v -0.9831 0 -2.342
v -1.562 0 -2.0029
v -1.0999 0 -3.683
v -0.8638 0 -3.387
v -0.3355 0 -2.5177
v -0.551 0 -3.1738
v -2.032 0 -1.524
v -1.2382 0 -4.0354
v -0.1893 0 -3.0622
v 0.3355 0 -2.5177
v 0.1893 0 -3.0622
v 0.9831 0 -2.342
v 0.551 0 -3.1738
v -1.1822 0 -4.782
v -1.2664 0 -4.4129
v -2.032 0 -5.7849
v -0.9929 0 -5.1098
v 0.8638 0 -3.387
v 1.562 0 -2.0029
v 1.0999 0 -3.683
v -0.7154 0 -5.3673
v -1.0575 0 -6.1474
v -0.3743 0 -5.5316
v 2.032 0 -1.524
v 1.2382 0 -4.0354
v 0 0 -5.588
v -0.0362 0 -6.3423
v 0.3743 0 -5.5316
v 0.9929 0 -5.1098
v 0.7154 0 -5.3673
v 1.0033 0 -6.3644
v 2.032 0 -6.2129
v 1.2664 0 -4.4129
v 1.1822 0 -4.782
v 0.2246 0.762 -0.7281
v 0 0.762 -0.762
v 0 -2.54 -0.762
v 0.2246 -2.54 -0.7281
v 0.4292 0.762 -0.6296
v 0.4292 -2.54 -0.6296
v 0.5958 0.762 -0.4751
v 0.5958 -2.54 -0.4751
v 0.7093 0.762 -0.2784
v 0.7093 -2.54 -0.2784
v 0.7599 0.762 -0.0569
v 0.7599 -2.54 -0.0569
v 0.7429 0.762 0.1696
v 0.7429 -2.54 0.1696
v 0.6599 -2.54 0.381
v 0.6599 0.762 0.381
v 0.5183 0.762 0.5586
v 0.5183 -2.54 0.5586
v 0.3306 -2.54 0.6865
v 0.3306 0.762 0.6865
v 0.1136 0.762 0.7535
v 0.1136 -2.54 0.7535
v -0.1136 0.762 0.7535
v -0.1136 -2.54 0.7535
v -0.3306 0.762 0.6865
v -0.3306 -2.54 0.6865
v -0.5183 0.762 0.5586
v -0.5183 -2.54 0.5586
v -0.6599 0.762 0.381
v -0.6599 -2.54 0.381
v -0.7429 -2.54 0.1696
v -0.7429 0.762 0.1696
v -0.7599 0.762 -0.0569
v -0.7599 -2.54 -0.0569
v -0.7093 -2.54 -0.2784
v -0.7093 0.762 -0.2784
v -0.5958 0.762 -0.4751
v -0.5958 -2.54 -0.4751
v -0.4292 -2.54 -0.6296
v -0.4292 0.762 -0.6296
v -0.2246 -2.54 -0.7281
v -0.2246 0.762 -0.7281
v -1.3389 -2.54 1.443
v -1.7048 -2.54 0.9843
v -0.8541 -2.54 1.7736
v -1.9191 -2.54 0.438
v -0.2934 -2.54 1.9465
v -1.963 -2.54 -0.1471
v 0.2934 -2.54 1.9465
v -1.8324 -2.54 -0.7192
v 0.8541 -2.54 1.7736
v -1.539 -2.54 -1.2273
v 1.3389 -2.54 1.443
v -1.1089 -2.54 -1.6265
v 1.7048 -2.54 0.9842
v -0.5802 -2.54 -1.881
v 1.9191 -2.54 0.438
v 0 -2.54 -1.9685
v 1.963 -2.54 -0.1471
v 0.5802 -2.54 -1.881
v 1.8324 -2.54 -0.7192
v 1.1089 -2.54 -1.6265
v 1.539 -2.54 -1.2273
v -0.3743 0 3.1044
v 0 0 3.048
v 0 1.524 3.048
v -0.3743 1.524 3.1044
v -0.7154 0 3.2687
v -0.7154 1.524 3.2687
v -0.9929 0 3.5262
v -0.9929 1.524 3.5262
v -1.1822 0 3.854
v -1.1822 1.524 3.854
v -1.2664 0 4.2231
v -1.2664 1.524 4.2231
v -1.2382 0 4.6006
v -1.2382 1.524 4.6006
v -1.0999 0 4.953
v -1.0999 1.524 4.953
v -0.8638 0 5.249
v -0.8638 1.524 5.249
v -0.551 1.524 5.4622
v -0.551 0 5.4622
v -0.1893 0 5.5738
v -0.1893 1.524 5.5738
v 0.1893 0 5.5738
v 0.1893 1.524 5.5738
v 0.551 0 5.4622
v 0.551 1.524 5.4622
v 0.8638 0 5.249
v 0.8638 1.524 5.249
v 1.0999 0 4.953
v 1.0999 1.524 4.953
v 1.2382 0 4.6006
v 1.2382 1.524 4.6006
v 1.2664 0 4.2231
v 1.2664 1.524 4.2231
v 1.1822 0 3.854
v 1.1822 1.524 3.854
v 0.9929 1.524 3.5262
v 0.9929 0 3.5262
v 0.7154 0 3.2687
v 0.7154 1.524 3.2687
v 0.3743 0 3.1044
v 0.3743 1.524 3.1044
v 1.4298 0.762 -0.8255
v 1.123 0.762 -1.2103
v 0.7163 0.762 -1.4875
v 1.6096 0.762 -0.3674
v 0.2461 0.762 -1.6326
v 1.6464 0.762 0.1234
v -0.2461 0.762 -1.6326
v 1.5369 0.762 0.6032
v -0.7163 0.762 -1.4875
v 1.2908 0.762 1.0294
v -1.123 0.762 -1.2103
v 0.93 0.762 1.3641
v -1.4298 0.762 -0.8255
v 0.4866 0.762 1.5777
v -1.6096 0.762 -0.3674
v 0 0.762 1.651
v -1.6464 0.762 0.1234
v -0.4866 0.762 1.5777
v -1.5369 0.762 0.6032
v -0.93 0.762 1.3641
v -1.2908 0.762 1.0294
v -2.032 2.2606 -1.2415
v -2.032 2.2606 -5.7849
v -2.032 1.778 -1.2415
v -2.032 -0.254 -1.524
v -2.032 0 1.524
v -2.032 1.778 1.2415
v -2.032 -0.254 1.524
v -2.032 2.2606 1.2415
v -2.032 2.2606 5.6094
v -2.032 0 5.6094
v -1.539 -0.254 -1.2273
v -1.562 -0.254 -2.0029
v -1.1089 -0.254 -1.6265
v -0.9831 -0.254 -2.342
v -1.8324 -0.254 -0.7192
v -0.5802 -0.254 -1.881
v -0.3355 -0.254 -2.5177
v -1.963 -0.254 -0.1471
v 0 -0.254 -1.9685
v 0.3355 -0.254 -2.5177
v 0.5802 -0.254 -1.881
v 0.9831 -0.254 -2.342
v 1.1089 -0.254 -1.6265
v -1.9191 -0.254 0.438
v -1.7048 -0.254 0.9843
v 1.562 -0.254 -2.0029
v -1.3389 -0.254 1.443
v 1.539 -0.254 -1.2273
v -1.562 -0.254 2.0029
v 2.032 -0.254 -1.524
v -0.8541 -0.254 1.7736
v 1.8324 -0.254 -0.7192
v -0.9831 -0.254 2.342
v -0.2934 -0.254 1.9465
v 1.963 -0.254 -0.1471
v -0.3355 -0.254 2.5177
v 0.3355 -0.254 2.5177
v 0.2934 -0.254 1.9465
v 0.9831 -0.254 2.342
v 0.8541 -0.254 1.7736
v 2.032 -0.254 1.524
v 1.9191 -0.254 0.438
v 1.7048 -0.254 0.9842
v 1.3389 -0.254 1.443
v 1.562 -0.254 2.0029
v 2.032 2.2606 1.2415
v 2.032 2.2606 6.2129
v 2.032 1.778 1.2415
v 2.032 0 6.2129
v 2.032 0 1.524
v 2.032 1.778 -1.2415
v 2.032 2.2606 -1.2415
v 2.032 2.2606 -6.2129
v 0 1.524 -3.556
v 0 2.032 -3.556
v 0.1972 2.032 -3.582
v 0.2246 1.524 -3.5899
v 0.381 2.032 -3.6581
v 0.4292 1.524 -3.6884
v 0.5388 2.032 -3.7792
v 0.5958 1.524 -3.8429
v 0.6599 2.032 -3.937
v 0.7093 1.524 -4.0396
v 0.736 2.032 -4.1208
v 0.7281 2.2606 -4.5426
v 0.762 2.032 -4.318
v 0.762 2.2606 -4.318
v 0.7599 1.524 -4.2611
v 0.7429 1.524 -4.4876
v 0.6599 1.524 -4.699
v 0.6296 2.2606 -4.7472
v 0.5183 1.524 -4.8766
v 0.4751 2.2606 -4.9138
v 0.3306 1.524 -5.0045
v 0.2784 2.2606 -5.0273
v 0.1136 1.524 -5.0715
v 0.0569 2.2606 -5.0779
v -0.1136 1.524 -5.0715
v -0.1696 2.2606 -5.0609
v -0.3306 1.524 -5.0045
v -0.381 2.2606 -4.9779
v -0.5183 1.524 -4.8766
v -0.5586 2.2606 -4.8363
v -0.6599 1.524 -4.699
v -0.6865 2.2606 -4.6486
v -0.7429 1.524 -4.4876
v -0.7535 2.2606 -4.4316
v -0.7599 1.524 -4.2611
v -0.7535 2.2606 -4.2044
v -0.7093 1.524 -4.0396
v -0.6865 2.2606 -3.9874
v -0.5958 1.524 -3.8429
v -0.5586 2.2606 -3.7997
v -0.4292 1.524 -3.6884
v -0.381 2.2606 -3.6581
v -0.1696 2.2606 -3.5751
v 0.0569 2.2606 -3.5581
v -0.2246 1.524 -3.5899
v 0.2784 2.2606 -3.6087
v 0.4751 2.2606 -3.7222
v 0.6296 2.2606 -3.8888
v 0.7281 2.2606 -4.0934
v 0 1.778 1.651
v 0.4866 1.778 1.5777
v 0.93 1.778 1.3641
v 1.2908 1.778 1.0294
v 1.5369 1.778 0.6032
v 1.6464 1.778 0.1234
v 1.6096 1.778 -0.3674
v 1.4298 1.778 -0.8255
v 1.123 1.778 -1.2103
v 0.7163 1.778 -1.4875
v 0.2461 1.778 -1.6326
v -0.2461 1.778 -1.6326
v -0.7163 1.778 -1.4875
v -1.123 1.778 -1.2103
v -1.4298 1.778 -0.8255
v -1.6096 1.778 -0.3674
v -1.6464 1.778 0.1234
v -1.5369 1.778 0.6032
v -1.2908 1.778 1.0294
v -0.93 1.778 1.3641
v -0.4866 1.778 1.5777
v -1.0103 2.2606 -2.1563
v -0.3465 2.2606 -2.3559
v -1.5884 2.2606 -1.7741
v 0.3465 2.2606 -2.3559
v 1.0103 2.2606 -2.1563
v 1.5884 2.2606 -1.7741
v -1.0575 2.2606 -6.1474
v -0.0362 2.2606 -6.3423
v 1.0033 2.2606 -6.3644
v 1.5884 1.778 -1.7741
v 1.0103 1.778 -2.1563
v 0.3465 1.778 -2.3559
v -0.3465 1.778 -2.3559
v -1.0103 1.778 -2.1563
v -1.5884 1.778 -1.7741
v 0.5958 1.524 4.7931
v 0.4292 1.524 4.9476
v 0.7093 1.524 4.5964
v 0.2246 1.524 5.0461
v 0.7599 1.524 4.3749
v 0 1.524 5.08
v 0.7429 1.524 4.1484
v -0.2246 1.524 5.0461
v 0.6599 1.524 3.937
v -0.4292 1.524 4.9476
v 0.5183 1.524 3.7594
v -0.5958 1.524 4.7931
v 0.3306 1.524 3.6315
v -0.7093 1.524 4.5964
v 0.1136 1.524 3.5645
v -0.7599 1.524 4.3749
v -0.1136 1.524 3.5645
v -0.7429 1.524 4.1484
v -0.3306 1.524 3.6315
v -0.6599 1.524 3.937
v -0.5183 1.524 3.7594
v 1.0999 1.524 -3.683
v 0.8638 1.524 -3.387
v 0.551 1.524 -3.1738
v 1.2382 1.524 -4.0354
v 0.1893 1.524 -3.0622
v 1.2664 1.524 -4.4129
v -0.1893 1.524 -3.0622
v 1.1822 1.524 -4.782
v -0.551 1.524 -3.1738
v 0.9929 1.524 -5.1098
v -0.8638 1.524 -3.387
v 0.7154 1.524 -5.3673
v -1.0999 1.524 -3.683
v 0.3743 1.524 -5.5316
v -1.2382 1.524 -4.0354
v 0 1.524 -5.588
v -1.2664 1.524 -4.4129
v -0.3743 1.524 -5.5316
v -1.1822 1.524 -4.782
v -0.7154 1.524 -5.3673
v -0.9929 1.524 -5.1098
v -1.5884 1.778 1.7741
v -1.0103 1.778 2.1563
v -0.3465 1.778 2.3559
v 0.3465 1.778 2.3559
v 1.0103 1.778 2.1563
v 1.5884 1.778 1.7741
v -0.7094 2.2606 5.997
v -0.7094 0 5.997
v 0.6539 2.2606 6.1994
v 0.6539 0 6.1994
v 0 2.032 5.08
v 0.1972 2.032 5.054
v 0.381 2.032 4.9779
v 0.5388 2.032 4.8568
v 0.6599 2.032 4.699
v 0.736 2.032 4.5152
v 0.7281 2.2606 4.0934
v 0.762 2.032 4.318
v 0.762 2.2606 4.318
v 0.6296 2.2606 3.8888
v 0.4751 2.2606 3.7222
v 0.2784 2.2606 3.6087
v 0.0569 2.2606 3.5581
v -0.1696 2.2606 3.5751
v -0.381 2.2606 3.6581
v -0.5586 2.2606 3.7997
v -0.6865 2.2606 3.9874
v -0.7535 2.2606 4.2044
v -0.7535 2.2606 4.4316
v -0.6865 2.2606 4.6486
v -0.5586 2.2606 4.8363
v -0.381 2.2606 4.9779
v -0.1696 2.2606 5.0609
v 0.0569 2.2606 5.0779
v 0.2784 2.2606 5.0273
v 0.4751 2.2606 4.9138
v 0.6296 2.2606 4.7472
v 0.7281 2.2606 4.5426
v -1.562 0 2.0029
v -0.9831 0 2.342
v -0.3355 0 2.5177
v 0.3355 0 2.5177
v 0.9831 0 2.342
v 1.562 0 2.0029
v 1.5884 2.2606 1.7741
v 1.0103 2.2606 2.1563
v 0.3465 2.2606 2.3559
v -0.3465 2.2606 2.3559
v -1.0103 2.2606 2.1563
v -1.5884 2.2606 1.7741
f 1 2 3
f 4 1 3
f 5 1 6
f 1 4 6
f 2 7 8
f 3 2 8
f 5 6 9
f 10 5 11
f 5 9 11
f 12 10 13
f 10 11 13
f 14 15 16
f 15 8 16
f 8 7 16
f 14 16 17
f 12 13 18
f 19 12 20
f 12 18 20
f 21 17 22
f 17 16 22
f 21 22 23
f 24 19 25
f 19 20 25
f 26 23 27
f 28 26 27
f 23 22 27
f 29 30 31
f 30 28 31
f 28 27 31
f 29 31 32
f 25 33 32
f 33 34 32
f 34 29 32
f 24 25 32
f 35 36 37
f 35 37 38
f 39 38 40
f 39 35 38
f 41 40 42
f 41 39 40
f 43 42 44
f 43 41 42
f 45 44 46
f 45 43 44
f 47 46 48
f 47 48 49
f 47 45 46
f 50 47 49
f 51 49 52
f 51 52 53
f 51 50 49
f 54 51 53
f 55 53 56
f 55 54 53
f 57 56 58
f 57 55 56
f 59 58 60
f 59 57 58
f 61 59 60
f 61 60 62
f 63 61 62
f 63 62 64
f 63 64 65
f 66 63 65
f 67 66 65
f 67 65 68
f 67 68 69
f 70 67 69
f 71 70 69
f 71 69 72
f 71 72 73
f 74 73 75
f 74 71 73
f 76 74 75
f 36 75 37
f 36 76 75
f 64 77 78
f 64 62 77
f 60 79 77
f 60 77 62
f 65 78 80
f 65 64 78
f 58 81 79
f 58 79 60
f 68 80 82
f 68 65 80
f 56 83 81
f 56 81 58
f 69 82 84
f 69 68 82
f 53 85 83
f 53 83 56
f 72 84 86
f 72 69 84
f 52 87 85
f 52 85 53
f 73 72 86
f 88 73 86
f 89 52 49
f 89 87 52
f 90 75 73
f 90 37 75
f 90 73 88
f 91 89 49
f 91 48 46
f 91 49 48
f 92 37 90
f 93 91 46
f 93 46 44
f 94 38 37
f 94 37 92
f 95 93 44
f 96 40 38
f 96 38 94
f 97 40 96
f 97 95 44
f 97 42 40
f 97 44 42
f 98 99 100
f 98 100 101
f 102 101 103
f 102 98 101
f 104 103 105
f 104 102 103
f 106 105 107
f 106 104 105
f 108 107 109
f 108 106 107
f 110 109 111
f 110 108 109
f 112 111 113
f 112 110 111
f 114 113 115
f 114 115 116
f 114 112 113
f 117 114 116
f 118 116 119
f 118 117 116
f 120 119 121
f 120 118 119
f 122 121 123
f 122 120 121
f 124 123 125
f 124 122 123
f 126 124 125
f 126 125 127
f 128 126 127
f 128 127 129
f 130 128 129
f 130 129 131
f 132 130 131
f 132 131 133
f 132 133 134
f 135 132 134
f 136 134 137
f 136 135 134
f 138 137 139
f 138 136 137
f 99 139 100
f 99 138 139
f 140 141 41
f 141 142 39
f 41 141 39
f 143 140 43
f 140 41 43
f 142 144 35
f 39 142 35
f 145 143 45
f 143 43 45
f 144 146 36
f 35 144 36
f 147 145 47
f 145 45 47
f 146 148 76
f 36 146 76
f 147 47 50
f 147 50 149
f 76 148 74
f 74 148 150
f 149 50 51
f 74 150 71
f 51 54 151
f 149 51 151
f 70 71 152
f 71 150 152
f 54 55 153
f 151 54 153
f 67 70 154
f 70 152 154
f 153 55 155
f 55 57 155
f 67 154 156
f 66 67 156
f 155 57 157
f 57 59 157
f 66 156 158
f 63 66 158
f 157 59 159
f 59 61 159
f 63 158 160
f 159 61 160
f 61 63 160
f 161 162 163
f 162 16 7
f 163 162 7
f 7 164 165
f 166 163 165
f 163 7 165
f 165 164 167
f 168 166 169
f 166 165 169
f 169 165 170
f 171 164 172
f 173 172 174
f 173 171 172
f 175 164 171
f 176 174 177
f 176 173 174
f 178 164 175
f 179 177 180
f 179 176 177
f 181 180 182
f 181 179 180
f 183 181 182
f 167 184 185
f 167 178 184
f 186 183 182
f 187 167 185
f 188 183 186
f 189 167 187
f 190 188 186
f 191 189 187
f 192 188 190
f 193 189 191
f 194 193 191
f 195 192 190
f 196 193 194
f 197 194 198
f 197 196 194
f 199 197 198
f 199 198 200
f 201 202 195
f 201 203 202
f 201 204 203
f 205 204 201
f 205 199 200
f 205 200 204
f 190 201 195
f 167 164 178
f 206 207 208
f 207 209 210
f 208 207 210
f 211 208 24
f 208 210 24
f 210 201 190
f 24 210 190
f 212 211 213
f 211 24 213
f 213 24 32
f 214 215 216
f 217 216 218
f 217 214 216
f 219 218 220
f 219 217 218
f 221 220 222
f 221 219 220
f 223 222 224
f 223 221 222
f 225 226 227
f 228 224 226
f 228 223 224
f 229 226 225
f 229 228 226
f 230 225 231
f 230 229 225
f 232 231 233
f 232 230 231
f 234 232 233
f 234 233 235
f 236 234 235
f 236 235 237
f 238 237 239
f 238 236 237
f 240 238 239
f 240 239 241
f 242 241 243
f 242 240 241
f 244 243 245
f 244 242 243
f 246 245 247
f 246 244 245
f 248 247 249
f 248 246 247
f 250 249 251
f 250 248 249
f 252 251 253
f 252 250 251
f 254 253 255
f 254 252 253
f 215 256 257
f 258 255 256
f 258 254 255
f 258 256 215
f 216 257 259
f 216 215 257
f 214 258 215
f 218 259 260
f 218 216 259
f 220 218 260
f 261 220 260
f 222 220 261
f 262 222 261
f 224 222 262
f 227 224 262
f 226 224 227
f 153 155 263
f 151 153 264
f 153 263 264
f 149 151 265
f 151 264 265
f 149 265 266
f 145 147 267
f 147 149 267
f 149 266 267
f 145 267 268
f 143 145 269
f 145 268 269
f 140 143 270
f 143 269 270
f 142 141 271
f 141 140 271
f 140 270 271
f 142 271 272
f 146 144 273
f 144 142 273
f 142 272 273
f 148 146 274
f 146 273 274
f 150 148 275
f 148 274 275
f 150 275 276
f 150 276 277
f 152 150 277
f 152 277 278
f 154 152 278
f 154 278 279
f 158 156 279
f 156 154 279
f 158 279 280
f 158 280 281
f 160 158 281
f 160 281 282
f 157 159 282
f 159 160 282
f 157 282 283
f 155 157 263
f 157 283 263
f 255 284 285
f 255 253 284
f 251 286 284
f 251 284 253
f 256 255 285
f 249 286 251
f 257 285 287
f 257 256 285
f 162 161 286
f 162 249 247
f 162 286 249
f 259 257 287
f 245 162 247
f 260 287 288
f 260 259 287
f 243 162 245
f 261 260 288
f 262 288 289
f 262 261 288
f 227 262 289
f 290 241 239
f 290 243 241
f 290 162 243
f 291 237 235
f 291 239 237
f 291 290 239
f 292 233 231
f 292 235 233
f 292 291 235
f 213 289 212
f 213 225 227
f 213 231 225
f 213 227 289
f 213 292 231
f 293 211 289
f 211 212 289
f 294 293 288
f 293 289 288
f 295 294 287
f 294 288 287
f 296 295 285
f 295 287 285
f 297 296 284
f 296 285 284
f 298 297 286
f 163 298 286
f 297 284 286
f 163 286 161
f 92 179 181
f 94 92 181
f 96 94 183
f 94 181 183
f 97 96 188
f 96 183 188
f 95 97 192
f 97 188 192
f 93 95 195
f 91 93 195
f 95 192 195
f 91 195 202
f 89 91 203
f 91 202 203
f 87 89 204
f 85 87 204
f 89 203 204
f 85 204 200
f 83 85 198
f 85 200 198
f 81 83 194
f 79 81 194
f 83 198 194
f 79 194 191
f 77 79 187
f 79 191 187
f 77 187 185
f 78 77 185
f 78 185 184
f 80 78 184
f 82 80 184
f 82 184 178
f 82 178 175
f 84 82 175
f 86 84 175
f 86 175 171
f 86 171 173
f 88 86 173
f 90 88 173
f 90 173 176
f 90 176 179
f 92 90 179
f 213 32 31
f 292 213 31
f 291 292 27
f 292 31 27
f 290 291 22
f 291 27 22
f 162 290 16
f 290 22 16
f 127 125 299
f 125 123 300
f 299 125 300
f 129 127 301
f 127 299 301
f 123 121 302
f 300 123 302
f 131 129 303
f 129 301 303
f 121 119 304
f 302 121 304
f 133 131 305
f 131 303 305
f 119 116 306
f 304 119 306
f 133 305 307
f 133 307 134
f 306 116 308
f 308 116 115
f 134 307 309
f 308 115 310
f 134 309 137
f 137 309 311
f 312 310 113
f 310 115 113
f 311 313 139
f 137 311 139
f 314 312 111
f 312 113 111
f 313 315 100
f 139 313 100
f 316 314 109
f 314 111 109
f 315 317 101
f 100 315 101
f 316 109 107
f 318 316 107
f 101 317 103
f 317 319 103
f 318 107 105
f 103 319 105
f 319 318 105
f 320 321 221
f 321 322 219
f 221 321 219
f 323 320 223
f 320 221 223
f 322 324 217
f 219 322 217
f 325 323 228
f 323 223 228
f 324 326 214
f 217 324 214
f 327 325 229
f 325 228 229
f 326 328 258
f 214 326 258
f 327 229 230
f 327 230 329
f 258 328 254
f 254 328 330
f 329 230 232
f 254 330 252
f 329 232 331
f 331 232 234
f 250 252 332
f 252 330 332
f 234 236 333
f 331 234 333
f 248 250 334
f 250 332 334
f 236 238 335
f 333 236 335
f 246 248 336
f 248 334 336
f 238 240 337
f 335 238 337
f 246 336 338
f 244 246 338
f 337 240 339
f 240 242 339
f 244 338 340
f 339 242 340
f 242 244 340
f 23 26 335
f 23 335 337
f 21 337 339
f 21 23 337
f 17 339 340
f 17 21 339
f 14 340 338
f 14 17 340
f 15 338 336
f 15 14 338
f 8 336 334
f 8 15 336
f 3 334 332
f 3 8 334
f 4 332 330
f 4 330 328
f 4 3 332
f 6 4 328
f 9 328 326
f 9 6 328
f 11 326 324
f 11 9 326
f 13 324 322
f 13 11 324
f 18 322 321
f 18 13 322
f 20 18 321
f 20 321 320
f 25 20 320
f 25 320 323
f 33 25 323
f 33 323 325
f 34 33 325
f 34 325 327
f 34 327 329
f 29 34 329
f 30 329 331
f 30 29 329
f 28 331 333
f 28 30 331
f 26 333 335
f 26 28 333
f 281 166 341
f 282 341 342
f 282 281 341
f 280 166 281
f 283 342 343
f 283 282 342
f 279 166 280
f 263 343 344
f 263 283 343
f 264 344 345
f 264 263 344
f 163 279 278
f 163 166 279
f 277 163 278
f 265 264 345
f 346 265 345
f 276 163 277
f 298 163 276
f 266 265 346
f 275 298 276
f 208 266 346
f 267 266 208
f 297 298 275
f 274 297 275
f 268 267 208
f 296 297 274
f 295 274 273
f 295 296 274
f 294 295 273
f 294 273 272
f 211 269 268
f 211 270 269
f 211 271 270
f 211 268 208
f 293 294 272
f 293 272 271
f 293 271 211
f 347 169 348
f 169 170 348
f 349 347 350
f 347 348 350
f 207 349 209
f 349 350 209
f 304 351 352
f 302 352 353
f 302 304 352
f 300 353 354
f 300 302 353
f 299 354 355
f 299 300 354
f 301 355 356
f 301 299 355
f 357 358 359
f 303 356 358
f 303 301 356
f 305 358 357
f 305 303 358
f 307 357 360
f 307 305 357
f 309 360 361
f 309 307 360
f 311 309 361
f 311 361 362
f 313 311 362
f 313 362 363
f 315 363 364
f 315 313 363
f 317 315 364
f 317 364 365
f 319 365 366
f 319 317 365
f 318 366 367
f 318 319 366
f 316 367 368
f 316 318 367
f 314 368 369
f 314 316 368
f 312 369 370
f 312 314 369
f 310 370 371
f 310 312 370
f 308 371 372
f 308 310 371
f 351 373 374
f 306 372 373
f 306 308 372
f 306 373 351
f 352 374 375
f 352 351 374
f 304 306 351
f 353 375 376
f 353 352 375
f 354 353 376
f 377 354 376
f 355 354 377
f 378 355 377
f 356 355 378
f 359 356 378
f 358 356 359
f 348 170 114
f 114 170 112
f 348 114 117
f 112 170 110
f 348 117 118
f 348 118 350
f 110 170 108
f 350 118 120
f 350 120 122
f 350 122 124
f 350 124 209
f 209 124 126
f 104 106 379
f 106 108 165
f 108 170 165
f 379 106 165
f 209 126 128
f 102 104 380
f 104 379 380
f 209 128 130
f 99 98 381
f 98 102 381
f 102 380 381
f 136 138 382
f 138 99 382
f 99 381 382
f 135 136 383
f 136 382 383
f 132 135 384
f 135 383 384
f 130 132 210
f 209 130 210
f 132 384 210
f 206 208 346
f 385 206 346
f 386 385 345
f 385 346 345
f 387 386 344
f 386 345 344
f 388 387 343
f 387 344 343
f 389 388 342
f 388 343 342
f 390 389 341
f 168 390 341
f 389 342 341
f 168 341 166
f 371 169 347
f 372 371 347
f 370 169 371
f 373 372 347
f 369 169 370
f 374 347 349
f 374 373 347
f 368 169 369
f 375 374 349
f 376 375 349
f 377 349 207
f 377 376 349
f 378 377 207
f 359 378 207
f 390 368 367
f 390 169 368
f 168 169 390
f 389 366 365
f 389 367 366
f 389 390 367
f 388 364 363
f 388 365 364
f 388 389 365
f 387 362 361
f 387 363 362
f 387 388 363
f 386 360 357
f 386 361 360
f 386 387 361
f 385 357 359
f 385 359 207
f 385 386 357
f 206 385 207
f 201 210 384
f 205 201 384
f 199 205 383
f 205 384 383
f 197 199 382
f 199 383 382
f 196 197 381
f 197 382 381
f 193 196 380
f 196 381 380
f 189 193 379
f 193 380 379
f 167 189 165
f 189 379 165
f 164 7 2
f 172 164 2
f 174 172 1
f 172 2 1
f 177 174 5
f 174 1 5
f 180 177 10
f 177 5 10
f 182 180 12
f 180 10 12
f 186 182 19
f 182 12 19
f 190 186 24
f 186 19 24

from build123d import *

# Parameters (mm, degrees)
SKETCH1_R                = 1.524
SKETCH1_R_2              = 1.27
SKETCH1_R_3              = 0.762
BOSS_EXTRUDE1_DEPTH      = 2.032
SKETCH1_3_R              = 1.27
SKETCH1_3_R_2            = 0.762
CUT_EXTRUDE1_DEPTH       = 1.524
SKETCH3_R                = 1.651
CUT_EXTRUDE2_DEPTH       = 0.254
SKETCH3_3_R              = 1.651
CUT_EXTRUDE3_DEPTH       = 2.032
SKETCH4_R                = 1.9685
BOSS_EXTRUDE2_DEPTH      = 0.254
BOSS_EXTRUDE3_DEPTH      = 2.54
BOSS_EXTRUDE3_DEPTH_BACK = 0.762
SKETCH4_3_R              = 1.9685
SKETCH4_3_R_2            = 1.651
SKETCH4_3_R_3            = 0.762
CUT_EXTRUDE4_DEPTH       = 2.032
SKETCH10_R               = 0.762
BOSS_EXTRUDE4_DEPTH      = 0.2286


with BuildPart() as part:
    # Sketch1 → Boss-Extrude1 (new body)
    # profile 1 of 7: a face of its own
    with BuildSketch(Plane(origin=(0, 0, 0), x_dir=(1, 0, 0), z_dir=(0, 1, 0))):
        with BuildLine():
            Line((2.032, -6.212875778), (2.032, -1.24150214))
            ThreePointArc((2.032, -1.24150214), (0, -2.38125), (-2.032, -1.24150214))
            Line((-2.032, -1.24150214), (-2.032, -6.206396707))
            ThreePointArc((-2.032, -6.206396707), (-0.877113637, -6.887720967), (0.461163405, -6.804175651))
            Line((0.461163405, -6.804175651), (2.032, -6.212875778))
        make_face()
        with Locations((0, -4.318)):
            Circle(SKETCH1_R, mode=Mode.SUBTRACT)
    # profile 2 of 7: a face of its own
    with BuildSketch(Plane(origin=(0, 0, 0), x_dir=(1, 0, 0), z_dir=(0, 1, 0))):
        with BuildLine():
            Line((2.032, 1.24150214), (2.032, 6.212875778))
            Line((2.032, 6.212875778), (0.461163405, 6.804175651))
            ThreePointArc((0.461163405, 6.804175651), (-0.877113637, 6.887720967), (-2.032, 6.206396707))
            Line((-2.032, 6.206396707), (-2.032, 1.24150214))
            ThreePointArc((-2.032, 1.24150214), (0, 2.38125), (2.032, 1.24150214))
        make_face()
        with Locations((0, 4.318)):
            Circle(SKETCH1_R, mode=Mode.SUBTRACT)
    # profile 3 of 7: a face of its own
    with BuildSketch(Plane(origin=(0, 0, 0), x_dir=(1, 0, 0), z_dir=(0, 1, 0))):
        with BuildLine():
            Line((2.032, -1.24150214), (2.032, 1.24150214))
            ThreePointArc((2.032, 1.24150214), (0, 2.38125), (-2.032, 1.24150214))
            Line((-2.032, 1.24150214), (-2.032, -1.24150214))
            ThreePointArc((-2.032, -1.24150214), (0, -2.38125), (2.032, -1.24150214))
        make_face()
    # profile 4 of 7: a face of its own
    with BuildSketch(Plane(origin=(0, 0, 0), x_dir=(1, 0, 0), z_dir=(0, 1, 0))):
        with Locations((0, -4.318)):
            Circle(SKETCH1_R)
        with Locations((0, -4.318)):
            Circle(SKETCH1_R_2, mode=Mode.SUBTRACT)
    # profile 5 of 7: a face of its own
    with BuildSketch(Plane(origin=(0, 0, 0), x_dir=(1, 0, 0), z_dir=(0, 1, 0))):
        with Locations((0, -4.318)):
            Circle(SKETCH1_R_2)
        with Locations(Location((0, -4.318, 0), (0, 0, 270))):
            Circle(SKETCH1_R_3, mode=Mode.SUBTRACT)
    # profile 6 of 7: a face of its own
    with BuildSketch(Plane(origin=(0, 0, 0), x_dir=(1, 0, 0), z_dir=(0, 1, 0))):
        with Locations((0, 4.318)):
            Circle(SKETCH1_R)
        with Locations((0, 4.318)):
            Circle(SKETCH1_R_2, mode=Mode.SUBTRACT)
    # profile 7 of 7: a face of its own
    with BuildSketch(Plane(origin=(0, 0, 0), x_dir=(1, 0, 0), z_dir=(0, 1, 0))):
        with Locations((0, 4.318)):
            Circle(SKETCH1_R_2)
        with Locations(Location((0, 4.318, 0), (0, 0, 270))):
            Circle(SKETCH1_R_3, mode=Mode.SUBTRACT)
    extrude(amount=BOSS_EXTRUDE1_DEPTH)

    # Sketch1<3> → Cut-Extrude1 (cut)
    # profile 1 of 2: a face of its own
    with BuildSketch(Plane(origin=(0, 0, 0), x_dir=(1, 0, 0), z_dir=(0, 1, 0))):
        with Locations(Location((0, -4.318, 0), (0, 0, 90))):
            Circle(SKETCH1_3_R)
        with Locations(Location((0, -4.318, 0), (0, 0, 270))):
            Circle(SKETCH1_3_R_2, mode=Mode.SUBTRACT)
    # profile 2 of 2: a face of its own
    with BuildSketch(Plane(origin=(0, 0, 0), x_dir=(1, 0, 0), z_dir=(0, 1, 0))):
        with Locations(Location((0, 4.318, 0), (0, 0, 90))):
            Circle(SKETCH1_3_R)
        with Locations(Location((0, 4.318, 0), (0, 0, 270))):
            Circle(SKETCH1_3_R_2, mode=Mode.SUBTRACT)
    extrude(amount=CUT_EXTRUDE1_DEPTH, mode=Mode.SUBTRACT)

    # Sketch3 → Cut-Extrude2 (cut)
    # profile 1 of 2: a face of its own
    with BuildSketch(Plane(origin=(0, 2.032, 0), x_dir=(1, 0, 0), z_dir=(0, 1, 0))):
        with BuildLine():
            Line((2.032, -1.24150214), (2.032, 1.24150214))
            ThreePointArc((2.032, 1.24150214), (0, 2.38125), (-2.032, 1.24150214))
            Line((-2.032, 1.24150214), (-2.032, -1.24150214))
            ThreePointArc((-2.032, -1.24150214), (0, -2.38125), (2.032, -1.24150214))
        make_face()
        Circle(SKETCH3_R, mode=Mode.SUBTRACT)
    # profile 2 of 2: a face of its own
    with BuildSketch(Plane(origin=(0, 2.032, 0), x_dir=(1, 0, 0), z_dir=(0, 1, 0))):
        Circle(SKETCH3_R)
    extrude(amount=-CUT_EXTRUDE2_DEPTH, mode=Mode.SUBTRACT)

    # Sketch3<3> → Cut-Extrude3 (cut)
    with BuildSketch(Plane(origin=(0, 2.032, 0), x_dir=(1, 0, 0), z_dir=(0, 1, 0))):
        with Locations(Location((0, 0, 0), (0, 0, 270))):
            Circle(SKETCH3_3_R)
    extrude(amount=-CUT_EXTRUDE3_DEPTH, mode=Mode.SUBTRACT)

    # Sketch4 → Boss-Extrude2 (add)
    with BuildSketch(Plane.XZ):
        with BuildLine():
            Line((2.032, -1.524), (2.032, 1.524))
            ThreePointArc((2.032, 1.524), (0, 2.54), (-2.032, 1.524))
            Line((-2.032, 1.524), (-2.032, -1.524))
            ThreePointArc((-2.032, -1.524), (0, -2.54), (2.032, -1.524))
        make_face()
        with Locations(Location((0, 0, 0), (0, 0, 270))):
            Circle(SKETCH4_R, mode=Mode.SUBTRACT)
    extrude(amount=BOSS_EXTRUDE2_DEPTH)

    # Sketch4<3> → Boss-Extrude3 (add, two sides: drawn at the far end of the back side and taken through both)
    # profile 1 of 2: a face of its own
    with BuildSketch(Plane.XZ.offset(-BOSS_EXTRUDE3_DEPTH_BACK)):
        with Locations(Location((0, 0, 0), (0, 0, 270))):
            Circle(SKETCH4_3_R)
        with Locations(Location((0, 0, 0), (0, 0, 90))):
            Circle(SKETCH4_3_R_2, mode=Mode.SUBTRACT)
    # profile 2 of 2: a face of its own
    with BuildSketch(Plane.XZ.offset(-BOSS_EXTRUDE3_DEPTH_BACK)):
        with Locations(Location((0, 0, 0), (0, 0, 90))):
            Circle(SKETCH4_3_R_2)
        with Locations(Location((0, 0, 0), (0, 0, 270))):
            Circle(SKETCH4_3_R_3, mode=Mode.SUBTRACT)
    extrude(amount=BOSS_EXTRUDE3_DEPTH + BOSS_EXTRUDE3_DEPTH_BACK)

    # Sketch6 → Cut-Extrude4 (cut)
    with BuildSketch(Plane.XZ):
        with BuildLine():
            Line((-2.032, 5.609449291), (-2.032, 6.206396707))
            ThreePointArc((-2.032, 6.206396707), (-0.003234375, 8.238399289), (2.032, 6.212875778))
            ThreePointArc((2.032, 6.212875778), (-0.031260659, 6.121699066), (-2.032, 5.609449291))
        make_face()
        with BuildLine():
            Line((-2.032, -5.784926759), (-2.032, -6.206396707))
            ThreePointArc((-2.032, -6.206396707), (-0.001969351, -7.444912354), (2.032, -6.212875778))
            ThreePointArc((2.032, -6.212875778), (-0.036162052, -6.342312682), (-2.032, -5.784926759))
        make_face()
    extrude(amount=-CUT_EXTRUDE4_DEPTH, mode=Mode.SUBTRACT)

    # Sketch10 → Boss-Extrude4 (add)
    # profile 1 of 2: a face of its own
    with BuildSketch(Plane(origin=(0, 2.032, 0), x_dir=(1, 0, 0), z_dir=(0, 1, 0))):
        with BuildLine():
            Line((-2.032, -1.24150214), (-2.032, -5.609449291))
            ThreePointArc((-2.032, -5.609449291), (-0.031260659, -6.121699066), (2.032, -6.212875778))
            Line((2.032, -6.212875778), (2.032, -1.24150214))
            ThreePointArc((2.032, -1.24150214), (0, -2.38125), (-2.032, -1.24150214))
        make_face()
        with Locations((0, -4.318)):
            Circle(SKETCH10_R, mode=Mode.SUBTRACT)
    # profile 2 of 2: a face of its own
    with BuildSketch(Plane(origin=(0, 2.032, 0), x_dir=(1, 0, 0), z_dir=(0, 1, 0))):
        with BuildLine():
            Line((-2.032, 5.784926759), (-2.032, 1.24150214))
            ThreePointArc((-2.032, 1.24150214), (0, 2.38125), (2.032, 1.24150214))
            Line((2.032, 1.24150214), (2.032, 6.212875778))
            ThreePointArc((2.032, 6.212875778), (-0.036162052, 6.342312682), (-2.032, 5.784926759))
        make_face()
        with Locations((0, 4.318)):
            Circle(SKETCH10_R, mode=Mode.SUBTRACT)
    extrude(amount=BOSS_EXTRUDE4_DEPTH)


solid = part.part
